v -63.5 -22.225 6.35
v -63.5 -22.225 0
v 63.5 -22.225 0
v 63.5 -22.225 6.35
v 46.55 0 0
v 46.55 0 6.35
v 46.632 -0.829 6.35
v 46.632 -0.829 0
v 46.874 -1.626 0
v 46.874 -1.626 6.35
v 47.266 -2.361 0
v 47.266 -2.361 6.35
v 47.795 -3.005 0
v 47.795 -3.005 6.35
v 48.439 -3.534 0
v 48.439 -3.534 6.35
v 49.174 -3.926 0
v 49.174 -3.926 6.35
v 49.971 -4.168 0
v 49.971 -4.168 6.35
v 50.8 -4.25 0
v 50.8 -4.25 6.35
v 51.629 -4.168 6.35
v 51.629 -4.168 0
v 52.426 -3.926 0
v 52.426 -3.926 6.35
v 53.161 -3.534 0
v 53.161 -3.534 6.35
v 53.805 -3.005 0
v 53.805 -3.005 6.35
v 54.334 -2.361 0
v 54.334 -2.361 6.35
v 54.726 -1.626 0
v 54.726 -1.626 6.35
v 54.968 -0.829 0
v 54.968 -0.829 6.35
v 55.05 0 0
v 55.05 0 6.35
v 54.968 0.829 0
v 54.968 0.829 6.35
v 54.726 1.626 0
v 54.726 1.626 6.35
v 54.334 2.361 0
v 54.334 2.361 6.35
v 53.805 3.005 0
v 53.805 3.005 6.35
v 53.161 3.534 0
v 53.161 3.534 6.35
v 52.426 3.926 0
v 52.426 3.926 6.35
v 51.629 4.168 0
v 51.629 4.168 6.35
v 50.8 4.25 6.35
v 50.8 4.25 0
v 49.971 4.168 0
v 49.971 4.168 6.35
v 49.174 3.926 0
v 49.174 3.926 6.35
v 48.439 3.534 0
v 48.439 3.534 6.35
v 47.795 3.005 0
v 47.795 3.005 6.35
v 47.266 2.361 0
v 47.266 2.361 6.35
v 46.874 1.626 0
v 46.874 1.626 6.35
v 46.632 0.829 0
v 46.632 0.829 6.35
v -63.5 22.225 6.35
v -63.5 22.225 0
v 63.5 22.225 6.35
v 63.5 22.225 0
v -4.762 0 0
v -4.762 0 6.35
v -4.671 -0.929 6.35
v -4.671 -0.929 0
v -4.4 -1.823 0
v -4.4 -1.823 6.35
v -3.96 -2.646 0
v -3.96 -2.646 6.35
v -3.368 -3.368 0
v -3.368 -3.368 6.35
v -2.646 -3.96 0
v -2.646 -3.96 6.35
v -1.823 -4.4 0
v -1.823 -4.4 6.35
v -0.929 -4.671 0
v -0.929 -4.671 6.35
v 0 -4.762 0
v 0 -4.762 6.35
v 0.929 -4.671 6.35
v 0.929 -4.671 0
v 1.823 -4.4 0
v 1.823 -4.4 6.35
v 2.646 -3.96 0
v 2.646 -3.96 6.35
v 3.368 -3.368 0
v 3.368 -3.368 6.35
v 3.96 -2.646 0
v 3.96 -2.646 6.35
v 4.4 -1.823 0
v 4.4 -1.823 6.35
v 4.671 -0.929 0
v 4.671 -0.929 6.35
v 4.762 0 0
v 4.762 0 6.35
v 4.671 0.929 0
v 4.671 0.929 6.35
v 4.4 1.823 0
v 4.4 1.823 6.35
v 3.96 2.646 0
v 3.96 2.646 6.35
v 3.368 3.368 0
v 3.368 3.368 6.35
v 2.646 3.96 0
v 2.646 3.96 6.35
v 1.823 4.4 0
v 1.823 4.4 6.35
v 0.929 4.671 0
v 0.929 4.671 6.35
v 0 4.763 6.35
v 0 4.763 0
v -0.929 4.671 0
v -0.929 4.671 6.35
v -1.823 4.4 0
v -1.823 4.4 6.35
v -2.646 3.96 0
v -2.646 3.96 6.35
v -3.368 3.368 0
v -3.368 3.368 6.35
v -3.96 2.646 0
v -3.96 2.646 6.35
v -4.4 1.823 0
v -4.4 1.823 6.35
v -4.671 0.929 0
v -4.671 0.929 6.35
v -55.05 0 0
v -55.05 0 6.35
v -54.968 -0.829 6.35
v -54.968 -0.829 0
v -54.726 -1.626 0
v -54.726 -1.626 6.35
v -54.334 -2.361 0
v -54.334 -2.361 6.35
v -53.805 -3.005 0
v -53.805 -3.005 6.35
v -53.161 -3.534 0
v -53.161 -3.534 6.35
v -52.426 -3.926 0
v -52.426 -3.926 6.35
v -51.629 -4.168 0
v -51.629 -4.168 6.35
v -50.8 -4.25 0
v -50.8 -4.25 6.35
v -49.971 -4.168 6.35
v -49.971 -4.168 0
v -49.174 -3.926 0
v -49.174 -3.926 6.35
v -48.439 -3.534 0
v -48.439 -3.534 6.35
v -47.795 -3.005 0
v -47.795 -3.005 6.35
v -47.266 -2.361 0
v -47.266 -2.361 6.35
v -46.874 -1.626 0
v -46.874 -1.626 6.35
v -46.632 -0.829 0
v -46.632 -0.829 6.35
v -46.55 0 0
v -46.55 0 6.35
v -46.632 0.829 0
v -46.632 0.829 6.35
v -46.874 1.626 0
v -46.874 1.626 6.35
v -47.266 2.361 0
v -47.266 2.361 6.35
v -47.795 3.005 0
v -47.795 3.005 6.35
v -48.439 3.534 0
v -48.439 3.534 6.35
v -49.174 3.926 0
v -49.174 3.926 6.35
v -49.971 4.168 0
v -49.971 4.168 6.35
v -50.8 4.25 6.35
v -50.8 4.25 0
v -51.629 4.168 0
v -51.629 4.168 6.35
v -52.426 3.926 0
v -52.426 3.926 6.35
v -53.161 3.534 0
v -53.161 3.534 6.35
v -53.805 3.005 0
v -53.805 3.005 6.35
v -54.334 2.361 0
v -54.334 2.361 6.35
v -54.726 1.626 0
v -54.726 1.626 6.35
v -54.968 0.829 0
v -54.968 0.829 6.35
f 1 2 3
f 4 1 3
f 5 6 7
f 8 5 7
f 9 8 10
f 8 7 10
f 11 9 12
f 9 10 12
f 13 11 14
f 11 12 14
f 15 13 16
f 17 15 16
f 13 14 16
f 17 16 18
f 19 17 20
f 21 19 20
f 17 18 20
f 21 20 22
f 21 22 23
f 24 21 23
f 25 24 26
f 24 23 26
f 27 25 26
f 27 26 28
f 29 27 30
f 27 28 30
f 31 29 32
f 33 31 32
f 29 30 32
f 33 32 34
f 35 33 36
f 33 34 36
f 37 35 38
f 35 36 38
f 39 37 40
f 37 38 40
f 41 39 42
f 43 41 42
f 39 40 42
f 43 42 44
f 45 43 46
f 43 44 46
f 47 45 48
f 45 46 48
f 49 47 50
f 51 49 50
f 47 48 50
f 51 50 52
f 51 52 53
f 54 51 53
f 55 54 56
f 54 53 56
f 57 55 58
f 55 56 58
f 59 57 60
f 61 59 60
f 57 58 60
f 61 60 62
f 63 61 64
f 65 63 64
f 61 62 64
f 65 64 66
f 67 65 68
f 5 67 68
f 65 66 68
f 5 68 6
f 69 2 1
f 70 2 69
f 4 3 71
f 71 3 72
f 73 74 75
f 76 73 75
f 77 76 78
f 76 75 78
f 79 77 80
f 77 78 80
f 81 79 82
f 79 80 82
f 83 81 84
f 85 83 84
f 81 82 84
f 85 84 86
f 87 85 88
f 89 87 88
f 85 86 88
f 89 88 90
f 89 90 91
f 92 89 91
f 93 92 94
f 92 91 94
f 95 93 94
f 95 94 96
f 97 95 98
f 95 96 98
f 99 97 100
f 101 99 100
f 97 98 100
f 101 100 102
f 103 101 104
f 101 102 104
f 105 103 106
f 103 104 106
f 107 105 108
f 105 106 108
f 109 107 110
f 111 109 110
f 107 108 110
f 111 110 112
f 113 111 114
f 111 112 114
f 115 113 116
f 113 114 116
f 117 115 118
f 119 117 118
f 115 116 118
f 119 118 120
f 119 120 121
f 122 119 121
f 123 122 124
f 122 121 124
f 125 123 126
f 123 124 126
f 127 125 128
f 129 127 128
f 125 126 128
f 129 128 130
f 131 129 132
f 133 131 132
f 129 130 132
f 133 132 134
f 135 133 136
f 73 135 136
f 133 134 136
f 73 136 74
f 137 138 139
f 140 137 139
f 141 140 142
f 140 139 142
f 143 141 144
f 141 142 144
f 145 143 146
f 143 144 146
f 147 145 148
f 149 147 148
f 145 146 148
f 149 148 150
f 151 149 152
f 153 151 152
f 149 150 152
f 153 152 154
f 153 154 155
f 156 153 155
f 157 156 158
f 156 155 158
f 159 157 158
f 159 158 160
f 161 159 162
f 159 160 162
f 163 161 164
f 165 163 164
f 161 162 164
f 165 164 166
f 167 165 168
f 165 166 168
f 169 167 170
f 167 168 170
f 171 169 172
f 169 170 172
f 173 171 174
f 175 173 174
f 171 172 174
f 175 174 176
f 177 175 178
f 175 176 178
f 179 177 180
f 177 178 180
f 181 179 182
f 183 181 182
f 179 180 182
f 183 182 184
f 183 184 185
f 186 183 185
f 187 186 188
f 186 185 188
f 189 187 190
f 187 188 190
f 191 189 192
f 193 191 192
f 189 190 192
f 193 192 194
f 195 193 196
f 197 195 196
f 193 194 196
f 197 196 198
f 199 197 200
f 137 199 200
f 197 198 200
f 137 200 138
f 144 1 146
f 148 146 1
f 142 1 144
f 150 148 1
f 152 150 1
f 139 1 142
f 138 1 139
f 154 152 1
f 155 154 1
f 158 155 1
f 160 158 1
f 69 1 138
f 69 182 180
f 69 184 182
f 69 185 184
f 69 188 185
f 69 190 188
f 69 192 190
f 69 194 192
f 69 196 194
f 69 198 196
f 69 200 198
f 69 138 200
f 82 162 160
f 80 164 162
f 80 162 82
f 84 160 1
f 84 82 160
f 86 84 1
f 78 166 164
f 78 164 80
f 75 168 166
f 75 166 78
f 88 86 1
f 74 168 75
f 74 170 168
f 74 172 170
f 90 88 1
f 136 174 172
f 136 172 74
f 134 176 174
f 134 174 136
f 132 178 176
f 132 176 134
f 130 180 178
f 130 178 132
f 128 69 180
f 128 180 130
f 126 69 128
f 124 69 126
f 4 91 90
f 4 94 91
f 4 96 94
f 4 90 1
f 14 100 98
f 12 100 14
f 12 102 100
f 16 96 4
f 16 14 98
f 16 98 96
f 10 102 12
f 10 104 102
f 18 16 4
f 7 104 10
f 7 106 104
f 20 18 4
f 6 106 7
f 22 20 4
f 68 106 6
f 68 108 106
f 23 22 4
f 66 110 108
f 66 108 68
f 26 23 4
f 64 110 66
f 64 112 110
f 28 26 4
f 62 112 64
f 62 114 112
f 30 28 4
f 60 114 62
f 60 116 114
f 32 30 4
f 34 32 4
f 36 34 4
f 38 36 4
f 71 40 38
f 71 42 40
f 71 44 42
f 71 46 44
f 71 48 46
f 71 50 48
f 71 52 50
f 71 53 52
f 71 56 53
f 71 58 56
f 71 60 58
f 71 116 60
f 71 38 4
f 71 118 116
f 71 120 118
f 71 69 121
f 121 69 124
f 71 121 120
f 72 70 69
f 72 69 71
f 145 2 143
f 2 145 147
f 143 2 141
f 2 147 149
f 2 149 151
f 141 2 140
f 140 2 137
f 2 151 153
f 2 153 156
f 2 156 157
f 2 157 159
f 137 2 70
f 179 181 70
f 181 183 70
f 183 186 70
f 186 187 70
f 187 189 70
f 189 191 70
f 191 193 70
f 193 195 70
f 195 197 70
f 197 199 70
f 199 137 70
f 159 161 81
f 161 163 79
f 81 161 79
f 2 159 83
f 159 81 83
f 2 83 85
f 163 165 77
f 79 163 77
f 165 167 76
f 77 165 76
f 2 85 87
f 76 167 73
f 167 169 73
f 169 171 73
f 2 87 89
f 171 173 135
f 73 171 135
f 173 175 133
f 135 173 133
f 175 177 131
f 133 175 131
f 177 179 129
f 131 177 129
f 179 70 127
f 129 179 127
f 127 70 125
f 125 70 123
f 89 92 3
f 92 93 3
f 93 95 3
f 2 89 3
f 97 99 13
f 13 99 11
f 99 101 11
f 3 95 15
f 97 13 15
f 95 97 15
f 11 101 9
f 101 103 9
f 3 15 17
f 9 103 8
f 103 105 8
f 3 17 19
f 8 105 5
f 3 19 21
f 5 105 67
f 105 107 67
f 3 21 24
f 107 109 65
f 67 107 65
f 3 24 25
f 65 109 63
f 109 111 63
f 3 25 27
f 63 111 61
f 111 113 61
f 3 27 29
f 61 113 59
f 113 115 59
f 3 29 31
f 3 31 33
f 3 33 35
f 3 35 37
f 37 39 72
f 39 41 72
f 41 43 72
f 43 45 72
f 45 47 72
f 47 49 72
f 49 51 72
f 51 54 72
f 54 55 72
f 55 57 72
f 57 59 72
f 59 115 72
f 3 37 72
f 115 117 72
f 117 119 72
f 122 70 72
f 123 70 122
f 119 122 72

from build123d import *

# Parameters (mm, degrees)
F0_W     = 127
F0_H     = 44.45
F1_DEPTH = 6.35
F3_DEPTH = 6.35


with BuildPart() as f1:
    # F0 (on Top) → F1 (new body)
    with BuildSketch(Plane.XY):
        Rectangle(F0_W, F0_H)
    extrude(amount=F1_DEPTH)

    # F2 (on face) → F3 (cut, through all)
    with BuildSketch(Plane.XY.offset(6.35)):
        with BuildLine():
            ThreePointArc((-46.55, 0), (-50.8, 4.25), (-55.05, 0))
            Line((-55.05, 0), (-46.55, 0))
        make_face()
        with BuildLine():
            ThreePointArc((55.05, 0), (50.8, 4.25), (46.55, 0))
            Line((46.55, 0), (55.05, 0))
        make_face()
        with BuildLine():
            Line((55.05, 0), (46.55, 0))
            ThreePointArc((46.55, 0), (50.8, -4.25), (55.05, 0))
        make_face()
        with BuildLine():
            ThreePointArc((4.7625, 0), (0, 4.7625), (-4.7625, 0))
            Line((-4.7625, 0), (4.7625, 0))
        make_face()
        with BuildLine():
            Line((4.7625, 0), (-4.7625, 0))
            ThreePointArc((-4.7625, 0), (0, -4.7625), (4.7625, 0))
        make_face()
        with BuildLine():
            Line((-46.55, 0), (-55.05, 0))
            ThreePointArc((-55.05, 0), (-50.8, -4.25), (-46.55, 0))
        make_face()
    extrude(amount=-F3_DEPTH, mode=Mode.SUBTRACT)


solid = f1.part
